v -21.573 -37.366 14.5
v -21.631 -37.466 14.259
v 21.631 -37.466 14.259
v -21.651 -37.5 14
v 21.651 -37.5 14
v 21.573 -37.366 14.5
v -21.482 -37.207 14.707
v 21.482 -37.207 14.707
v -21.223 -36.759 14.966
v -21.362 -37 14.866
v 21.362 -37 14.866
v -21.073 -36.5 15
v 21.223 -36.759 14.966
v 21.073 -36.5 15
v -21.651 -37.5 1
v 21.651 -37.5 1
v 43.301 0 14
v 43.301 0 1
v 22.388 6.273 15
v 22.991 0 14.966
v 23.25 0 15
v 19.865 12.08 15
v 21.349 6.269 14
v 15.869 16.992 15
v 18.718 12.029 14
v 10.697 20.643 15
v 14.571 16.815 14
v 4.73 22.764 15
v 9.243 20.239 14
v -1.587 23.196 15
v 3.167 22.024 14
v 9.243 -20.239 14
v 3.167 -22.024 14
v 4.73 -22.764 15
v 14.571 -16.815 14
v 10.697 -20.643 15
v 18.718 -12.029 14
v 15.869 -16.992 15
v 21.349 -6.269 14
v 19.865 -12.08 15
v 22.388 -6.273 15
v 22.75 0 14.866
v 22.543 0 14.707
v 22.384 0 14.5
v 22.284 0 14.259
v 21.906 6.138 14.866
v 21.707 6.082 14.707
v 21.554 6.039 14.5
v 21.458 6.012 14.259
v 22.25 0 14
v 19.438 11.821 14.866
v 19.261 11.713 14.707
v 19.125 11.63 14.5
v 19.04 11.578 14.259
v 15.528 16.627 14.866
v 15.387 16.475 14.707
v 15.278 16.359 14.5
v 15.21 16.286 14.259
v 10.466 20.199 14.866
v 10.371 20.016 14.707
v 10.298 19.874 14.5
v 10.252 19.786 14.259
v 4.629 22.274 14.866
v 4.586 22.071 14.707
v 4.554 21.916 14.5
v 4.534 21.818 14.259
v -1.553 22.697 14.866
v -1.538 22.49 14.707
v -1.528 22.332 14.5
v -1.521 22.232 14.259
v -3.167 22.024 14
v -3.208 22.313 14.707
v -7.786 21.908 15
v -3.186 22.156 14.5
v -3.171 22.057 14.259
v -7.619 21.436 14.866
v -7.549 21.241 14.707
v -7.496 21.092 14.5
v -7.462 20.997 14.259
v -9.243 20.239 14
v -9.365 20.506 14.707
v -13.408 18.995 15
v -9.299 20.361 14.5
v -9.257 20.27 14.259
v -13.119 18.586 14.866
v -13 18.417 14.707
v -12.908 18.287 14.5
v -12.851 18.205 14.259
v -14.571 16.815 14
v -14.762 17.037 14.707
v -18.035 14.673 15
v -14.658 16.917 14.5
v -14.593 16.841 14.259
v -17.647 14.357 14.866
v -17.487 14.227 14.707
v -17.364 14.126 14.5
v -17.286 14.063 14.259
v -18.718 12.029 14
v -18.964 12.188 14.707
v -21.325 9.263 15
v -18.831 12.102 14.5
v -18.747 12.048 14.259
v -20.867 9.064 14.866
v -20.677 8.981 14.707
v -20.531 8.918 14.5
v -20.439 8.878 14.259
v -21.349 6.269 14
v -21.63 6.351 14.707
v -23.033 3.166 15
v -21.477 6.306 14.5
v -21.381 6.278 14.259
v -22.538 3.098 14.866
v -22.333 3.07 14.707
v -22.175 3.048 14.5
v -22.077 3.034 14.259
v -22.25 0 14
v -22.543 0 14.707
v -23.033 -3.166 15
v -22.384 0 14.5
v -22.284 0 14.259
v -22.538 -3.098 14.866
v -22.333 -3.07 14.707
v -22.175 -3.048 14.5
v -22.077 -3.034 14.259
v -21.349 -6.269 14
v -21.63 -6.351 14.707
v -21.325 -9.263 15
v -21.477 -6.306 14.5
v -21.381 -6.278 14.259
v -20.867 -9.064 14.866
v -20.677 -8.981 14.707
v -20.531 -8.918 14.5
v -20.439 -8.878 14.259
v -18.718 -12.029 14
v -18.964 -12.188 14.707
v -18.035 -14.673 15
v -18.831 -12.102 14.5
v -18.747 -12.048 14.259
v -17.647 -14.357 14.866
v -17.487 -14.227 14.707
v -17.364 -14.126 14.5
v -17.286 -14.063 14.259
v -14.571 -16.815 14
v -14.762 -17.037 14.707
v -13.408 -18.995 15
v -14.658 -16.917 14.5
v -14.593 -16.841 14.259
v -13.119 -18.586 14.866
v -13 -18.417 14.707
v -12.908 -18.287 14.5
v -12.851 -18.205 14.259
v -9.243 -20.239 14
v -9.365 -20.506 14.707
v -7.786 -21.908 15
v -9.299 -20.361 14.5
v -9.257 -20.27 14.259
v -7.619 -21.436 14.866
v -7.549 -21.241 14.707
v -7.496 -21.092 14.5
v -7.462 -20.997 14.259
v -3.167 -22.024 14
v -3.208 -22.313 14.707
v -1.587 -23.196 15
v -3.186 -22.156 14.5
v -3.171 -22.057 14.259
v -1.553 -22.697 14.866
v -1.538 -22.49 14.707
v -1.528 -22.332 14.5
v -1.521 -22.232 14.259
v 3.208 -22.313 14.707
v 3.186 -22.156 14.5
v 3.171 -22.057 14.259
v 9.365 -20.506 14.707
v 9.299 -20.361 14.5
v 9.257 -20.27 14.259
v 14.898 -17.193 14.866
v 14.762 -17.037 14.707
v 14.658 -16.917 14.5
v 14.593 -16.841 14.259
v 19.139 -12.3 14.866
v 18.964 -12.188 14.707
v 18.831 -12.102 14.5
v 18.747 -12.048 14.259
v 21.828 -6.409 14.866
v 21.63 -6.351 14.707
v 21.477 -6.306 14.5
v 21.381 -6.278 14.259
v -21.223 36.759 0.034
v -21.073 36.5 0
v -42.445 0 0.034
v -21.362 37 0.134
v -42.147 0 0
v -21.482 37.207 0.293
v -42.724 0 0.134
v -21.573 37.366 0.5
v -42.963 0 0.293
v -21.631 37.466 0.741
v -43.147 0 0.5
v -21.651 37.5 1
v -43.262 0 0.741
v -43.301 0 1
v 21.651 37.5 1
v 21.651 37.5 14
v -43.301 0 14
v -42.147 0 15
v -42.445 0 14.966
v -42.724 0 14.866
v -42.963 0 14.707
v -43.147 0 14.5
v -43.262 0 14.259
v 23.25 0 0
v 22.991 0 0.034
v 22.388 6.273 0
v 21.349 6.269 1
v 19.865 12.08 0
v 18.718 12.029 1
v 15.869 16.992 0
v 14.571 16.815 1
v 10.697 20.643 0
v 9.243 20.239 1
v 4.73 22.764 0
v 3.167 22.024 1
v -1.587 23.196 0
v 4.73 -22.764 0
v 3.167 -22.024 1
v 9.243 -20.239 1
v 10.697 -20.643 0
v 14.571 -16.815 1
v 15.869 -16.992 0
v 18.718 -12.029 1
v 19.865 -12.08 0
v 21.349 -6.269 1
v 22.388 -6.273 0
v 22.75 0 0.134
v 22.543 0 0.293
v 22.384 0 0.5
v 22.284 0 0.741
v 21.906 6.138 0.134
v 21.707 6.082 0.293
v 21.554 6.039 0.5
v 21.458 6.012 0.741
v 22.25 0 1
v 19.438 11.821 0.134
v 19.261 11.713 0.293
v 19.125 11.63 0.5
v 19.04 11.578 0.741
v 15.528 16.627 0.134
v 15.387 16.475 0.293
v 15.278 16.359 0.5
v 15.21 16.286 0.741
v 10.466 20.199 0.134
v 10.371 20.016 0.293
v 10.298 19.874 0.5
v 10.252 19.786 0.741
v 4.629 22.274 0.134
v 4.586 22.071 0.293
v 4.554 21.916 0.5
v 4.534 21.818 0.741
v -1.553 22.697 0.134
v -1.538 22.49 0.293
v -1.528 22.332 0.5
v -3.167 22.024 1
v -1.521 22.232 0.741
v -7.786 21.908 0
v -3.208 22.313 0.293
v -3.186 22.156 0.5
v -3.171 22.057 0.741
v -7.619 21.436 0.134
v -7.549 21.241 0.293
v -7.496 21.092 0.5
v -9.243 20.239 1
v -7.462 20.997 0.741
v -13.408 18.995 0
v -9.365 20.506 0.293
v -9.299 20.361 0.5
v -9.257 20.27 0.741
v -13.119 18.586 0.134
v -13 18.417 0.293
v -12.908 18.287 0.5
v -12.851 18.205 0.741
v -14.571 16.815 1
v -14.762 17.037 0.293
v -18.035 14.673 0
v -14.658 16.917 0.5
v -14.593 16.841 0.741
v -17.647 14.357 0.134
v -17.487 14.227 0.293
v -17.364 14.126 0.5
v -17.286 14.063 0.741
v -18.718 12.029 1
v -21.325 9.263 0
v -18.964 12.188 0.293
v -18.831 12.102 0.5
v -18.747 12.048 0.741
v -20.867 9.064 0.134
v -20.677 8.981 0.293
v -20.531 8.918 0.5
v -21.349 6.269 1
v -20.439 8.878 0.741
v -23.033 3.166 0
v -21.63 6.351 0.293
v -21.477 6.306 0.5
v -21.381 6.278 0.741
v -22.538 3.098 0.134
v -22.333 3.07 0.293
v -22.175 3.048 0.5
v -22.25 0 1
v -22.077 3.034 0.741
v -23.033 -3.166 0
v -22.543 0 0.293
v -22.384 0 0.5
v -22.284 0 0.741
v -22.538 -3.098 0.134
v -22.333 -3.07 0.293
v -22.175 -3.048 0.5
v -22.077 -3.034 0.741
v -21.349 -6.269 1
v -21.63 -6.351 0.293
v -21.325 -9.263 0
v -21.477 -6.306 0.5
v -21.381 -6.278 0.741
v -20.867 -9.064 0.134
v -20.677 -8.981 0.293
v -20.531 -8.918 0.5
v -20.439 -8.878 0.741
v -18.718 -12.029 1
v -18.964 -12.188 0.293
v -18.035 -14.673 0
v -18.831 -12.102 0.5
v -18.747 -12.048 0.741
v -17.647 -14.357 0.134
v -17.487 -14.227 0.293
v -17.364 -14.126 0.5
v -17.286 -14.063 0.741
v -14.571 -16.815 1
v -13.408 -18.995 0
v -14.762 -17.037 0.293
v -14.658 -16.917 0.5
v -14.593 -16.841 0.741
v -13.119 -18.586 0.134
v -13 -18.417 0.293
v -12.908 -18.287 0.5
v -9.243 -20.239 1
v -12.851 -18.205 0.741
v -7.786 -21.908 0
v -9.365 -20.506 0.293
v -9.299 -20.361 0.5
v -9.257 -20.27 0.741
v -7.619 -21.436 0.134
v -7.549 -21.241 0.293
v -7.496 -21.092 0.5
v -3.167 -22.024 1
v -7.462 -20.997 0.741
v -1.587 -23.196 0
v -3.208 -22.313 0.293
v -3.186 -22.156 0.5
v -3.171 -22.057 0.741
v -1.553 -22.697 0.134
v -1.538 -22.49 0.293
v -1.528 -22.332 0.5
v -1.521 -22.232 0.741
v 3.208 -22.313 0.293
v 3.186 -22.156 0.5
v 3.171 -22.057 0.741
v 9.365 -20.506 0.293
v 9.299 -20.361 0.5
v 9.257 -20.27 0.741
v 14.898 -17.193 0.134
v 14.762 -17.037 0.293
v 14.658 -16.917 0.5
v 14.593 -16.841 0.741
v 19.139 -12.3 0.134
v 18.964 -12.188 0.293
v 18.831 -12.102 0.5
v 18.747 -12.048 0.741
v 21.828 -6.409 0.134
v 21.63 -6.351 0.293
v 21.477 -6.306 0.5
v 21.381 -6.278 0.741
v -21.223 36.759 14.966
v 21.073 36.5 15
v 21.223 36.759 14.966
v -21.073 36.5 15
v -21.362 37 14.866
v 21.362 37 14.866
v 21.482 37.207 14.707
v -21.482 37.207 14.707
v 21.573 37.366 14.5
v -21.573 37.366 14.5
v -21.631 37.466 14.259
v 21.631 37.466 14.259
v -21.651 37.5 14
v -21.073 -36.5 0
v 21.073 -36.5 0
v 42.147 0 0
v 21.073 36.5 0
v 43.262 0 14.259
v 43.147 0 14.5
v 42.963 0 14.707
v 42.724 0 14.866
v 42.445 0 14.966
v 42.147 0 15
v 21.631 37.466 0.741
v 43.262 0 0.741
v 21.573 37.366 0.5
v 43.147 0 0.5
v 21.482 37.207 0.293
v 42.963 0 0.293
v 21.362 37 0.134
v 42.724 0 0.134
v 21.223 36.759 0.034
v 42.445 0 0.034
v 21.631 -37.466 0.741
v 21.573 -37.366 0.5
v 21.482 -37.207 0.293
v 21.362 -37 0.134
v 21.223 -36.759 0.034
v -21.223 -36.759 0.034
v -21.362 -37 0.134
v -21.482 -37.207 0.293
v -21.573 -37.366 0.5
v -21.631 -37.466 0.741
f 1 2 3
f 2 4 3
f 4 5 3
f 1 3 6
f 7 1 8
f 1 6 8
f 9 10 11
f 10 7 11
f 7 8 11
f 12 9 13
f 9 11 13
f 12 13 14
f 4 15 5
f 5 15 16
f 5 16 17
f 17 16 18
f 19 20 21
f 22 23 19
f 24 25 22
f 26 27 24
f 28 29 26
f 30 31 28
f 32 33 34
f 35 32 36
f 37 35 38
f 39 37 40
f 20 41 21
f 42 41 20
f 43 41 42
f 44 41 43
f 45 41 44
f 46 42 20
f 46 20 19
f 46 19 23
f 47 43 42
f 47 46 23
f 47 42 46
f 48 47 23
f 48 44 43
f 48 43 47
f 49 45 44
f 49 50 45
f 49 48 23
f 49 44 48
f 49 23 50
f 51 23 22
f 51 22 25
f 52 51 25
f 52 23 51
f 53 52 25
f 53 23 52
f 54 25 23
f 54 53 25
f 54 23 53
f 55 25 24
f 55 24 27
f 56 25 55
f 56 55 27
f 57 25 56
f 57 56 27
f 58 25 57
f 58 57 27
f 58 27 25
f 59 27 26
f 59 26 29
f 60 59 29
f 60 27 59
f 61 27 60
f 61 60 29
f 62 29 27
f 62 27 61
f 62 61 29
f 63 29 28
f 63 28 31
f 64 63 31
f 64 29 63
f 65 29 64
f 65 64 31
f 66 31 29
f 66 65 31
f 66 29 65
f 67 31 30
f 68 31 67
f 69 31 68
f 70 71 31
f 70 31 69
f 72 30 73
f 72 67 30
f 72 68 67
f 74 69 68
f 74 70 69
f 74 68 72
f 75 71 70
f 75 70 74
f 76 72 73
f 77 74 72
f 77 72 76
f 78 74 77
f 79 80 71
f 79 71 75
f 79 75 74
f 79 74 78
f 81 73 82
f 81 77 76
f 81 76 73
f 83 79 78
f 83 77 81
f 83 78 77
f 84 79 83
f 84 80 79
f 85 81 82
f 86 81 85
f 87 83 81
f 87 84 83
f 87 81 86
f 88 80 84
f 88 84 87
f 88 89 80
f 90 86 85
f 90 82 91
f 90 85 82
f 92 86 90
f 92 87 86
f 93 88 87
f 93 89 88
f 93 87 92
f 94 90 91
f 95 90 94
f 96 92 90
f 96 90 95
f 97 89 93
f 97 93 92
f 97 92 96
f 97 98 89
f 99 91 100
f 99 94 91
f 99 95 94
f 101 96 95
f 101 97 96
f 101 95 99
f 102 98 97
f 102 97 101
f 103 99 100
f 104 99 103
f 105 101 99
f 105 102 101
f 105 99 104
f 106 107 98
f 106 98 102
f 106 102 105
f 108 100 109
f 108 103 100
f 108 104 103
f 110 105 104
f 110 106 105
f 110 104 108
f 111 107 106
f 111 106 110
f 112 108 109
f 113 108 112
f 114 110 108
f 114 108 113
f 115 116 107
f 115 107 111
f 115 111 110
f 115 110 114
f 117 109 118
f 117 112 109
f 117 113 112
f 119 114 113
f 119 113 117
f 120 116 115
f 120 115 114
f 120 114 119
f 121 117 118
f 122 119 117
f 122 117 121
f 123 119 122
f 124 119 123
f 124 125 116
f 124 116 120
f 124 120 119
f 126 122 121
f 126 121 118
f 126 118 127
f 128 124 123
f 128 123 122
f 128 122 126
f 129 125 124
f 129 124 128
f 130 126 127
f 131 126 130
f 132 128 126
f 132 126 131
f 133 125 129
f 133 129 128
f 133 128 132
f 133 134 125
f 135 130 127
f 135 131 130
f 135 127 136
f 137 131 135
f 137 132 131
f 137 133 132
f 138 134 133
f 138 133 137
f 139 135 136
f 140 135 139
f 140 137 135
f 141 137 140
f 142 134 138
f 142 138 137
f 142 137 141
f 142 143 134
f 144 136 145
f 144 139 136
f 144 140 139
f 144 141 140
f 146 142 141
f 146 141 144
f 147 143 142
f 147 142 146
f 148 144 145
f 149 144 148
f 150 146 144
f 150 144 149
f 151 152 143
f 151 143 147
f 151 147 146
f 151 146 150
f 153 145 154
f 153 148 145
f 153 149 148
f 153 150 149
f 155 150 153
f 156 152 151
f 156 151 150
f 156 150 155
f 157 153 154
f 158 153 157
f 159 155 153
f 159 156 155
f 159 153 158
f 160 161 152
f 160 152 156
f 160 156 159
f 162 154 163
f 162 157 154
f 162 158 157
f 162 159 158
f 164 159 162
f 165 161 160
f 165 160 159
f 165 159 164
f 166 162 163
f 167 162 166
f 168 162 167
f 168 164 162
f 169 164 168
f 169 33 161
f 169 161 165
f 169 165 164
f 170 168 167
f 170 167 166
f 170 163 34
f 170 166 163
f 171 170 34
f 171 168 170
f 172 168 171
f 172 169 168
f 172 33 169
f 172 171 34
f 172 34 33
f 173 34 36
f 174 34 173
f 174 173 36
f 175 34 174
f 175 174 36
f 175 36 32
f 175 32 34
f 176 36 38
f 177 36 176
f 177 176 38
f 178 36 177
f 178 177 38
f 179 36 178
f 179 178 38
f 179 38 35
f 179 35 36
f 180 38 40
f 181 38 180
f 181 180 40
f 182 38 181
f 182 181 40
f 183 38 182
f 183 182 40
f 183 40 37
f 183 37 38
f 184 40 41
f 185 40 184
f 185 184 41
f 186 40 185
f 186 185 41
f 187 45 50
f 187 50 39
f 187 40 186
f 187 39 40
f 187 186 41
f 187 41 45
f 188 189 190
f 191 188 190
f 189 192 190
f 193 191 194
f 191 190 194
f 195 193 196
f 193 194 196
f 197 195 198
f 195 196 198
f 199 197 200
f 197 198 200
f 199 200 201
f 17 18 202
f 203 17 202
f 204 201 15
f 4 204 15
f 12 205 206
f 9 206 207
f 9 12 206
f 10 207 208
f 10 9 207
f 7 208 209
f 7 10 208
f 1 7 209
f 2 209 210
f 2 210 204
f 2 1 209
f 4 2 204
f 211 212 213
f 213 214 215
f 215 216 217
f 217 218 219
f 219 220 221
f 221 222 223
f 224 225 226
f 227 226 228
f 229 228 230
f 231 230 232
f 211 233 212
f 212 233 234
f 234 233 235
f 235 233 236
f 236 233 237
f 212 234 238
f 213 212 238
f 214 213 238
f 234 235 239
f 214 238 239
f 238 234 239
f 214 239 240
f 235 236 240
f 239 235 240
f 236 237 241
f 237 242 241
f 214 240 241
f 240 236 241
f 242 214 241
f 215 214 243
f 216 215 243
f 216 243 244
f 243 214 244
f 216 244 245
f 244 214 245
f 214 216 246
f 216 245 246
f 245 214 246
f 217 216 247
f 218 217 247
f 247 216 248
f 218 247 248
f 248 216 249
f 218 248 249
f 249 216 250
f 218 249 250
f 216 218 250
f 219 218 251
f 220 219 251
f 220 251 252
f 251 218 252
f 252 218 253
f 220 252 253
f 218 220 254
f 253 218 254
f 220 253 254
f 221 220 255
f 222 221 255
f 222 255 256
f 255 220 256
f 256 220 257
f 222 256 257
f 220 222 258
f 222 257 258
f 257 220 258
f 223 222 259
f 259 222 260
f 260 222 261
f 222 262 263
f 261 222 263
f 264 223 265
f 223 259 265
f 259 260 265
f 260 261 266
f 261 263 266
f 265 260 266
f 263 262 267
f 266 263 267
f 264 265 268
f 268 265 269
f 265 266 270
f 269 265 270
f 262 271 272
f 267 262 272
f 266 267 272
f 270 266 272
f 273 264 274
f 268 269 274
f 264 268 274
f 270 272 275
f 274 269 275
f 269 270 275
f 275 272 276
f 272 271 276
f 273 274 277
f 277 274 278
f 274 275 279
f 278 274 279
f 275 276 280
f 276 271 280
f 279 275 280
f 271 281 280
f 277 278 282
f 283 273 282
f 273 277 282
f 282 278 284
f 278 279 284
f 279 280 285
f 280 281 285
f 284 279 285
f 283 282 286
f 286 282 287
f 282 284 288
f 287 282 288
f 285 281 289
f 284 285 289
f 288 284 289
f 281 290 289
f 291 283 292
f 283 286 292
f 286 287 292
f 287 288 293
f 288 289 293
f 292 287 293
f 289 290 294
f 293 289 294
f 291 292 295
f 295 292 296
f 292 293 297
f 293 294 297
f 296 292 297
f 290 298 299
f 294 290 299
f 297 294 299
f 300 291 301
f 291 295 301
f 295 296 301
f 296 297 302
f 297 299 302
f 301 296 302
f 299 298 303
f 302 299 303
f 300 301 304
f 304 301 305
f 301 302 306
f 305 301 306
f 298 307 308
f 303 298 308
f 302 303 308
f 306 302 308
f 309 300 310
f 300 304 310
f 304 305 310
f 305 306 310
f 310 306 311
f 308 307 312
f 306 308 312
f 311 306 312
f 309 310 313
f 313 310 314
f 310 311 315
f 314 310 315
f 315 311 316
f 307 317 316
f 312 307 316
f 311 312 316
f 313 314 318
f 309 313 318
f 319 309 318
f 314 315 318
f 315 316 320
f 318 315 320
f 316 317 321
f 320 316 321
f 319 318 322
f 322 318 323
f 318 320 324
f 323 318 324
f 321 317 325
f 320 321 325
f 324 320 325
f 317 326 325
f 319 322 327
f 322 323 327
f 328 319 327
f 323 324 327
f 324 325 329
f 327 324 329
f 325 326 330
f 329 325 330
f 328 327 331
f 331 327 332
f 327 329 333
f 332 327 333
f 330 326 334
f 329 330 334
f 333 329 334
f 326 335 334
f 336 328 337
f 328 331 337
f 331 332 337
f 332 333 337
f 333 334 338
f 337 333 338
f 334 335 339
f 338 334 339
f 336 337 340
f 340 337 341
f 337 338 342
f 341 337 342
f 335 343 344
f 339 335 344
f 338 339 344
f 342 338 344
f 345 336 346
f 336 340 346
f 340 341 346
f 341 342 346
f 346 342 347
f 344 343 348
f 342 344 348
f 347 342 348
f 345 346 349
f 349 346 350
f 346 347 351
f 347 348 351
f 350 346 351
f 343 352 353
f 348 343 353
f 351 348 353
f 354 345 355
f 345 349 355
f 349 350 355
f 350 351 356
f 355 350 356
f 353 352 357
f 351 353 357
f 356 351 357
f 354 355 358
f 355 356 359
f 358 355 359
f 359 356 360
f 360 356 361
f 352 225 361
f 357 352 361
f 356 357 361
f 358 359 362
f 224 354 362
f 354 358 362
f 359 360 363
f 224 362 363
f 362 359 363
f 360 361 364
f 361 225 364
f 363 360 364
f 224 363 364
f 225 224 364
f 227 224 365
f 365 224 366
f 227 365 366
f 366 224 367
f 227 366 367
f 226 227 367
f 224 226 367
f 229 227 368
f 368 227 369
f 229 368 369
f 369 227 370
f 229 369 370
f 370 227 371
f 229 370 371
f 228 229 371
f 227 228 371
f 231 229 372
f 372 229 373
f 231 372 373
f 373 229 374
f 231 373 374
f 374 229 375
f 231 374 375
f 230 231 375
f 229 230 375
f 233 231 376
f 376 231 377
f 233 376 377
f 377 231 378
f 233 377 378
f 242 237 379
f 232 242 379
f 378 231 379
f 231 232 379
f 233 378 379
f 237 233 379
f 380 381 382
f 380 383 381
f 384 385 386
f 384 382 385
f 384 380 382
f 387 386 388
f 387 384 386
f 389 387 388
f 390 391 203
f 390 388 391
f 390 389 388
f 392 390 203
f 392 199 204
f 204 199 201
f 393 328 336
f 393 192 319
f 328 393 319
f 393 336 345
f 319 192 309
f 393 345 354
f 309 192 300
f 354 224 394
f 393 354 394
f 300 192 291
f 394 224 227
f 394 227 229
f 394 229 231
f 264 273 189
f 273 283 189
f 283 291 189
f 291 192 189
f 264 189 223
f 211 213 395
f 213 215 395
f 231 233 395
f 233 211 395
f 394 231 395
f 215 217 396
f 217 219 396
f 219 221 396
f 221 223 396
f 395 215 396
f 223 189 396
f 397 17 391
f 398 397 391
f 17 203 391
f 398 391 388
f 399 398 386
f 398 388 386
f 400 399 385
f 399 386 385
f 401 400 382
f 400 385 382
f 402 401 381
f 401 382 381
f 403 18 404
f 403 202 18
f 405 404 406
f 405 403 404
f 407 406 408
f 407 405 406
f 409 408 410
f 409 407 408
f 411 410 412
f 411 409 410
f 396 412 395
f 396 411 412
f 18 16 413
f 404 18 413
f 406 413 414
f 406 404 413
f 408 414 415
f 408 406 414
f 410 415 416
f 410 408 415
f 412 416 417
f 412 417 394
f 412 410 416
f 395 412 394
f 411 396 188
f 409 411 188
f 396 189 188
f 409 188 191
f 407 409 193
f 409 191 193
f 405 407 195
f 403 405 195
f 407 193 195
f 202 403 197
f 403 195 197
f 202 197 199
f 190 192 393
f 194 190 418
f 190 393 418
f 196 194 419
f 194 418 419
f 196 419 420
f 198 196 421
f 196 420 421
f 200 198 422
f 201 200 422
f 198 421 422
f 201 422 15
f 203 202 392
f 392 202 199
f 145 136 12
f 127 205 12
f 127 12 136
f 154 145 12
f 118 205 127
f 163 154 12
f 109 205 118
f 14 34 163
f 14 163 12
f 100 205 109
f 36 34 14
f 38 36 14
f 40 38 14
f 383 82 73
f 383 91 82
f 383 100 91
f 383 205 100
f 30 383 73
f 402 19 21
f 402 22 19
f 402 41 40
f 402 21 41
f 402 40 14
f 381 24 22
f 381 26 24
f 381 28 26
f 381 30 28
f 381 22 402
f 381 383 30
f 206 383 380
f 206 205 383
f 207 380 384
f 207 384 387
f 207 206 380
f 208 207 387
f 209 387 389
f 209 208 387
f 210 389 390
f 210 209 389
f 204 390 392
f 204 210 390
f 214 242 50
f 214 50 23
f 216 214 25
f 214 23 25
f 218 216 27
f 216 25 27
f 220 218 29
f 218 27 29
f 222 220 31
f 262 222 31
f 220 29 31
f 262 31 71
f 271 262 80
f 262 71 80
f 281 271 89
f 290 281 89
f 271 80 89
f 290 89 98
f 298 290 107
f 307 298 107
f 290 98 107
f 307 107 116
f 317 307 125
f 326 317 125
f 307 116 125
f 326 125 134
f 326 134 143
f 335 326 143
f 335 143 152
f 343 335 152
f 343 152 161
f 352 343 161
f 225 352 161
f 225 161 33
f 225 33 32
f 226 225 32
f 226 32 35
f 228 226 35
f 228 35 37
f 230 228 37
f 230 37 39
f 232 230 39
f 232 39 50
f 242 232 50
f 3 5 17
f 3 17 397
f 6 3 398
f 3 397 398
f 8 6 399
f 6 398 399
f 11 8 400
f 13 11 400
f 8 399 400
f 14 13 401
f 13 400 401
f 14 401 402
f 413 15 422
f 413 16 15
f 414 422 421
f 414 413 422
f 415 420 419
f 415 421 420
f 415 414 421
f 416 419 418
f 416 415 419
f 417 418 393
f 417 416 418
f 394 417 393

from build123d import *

# Parameters (mm, degrees)
EXTRUDE_1_DEPTH     = 15
SKETCH_2_R          = 22.25
CUT_EXTRUDE_2_DEPTH = 60.213596412
FILLET_1_R          = 1


with BuildPart() as part:
    # 草图1 → 拉伸1 (new body)
    with BuildSketch(Plane.XY):
        Polygon((21.650635095, -37.5), (43.301270189, 0), (21.650635095, 37.5), (-21.650635095, 37.5), (-43.301270189, 0), (-21.650635095, -37.5), align=None)
    extrude(amount=EXTRUDE_1_DEPTH)

    # 草图2 → 拉伸2 (cut, through all)
    with BuildSketch(Plane.XY.offset(15)):
        Circle(SKETCH_2_R)
    extrude(amount=-CUT_EXTRUDE_2_DEPTH, mode=Mode.SUBTRACT)

    # 圆角1
    fillet_1_edges = [part.edges().sort_by_distance(p)[0] for p in [
        (32.475952642, 18.75, 15),
        (0, 37.5, 15),
        (-32.475952642, 18.75, 15),
        (-32.475952642, -18.75, 15),
        (-22.25, 0, 0),
        (-22.25, 0, 15),
        (0, -37.5, 15),
        (-32.475952642, -18.75, 0),
        (-32.475952642, 18.75, 0),
        (0, 37.5, 0),
        (32.475952642, -18.75, 15),
        (32.475952642, 18.75, 0),
        (32.475952642, -18.75, 0),
        (0, -37.5, 0),
    ]]
    fillet(fillet_1_edges, radius=FILLET_1_R)


solid = part.part
